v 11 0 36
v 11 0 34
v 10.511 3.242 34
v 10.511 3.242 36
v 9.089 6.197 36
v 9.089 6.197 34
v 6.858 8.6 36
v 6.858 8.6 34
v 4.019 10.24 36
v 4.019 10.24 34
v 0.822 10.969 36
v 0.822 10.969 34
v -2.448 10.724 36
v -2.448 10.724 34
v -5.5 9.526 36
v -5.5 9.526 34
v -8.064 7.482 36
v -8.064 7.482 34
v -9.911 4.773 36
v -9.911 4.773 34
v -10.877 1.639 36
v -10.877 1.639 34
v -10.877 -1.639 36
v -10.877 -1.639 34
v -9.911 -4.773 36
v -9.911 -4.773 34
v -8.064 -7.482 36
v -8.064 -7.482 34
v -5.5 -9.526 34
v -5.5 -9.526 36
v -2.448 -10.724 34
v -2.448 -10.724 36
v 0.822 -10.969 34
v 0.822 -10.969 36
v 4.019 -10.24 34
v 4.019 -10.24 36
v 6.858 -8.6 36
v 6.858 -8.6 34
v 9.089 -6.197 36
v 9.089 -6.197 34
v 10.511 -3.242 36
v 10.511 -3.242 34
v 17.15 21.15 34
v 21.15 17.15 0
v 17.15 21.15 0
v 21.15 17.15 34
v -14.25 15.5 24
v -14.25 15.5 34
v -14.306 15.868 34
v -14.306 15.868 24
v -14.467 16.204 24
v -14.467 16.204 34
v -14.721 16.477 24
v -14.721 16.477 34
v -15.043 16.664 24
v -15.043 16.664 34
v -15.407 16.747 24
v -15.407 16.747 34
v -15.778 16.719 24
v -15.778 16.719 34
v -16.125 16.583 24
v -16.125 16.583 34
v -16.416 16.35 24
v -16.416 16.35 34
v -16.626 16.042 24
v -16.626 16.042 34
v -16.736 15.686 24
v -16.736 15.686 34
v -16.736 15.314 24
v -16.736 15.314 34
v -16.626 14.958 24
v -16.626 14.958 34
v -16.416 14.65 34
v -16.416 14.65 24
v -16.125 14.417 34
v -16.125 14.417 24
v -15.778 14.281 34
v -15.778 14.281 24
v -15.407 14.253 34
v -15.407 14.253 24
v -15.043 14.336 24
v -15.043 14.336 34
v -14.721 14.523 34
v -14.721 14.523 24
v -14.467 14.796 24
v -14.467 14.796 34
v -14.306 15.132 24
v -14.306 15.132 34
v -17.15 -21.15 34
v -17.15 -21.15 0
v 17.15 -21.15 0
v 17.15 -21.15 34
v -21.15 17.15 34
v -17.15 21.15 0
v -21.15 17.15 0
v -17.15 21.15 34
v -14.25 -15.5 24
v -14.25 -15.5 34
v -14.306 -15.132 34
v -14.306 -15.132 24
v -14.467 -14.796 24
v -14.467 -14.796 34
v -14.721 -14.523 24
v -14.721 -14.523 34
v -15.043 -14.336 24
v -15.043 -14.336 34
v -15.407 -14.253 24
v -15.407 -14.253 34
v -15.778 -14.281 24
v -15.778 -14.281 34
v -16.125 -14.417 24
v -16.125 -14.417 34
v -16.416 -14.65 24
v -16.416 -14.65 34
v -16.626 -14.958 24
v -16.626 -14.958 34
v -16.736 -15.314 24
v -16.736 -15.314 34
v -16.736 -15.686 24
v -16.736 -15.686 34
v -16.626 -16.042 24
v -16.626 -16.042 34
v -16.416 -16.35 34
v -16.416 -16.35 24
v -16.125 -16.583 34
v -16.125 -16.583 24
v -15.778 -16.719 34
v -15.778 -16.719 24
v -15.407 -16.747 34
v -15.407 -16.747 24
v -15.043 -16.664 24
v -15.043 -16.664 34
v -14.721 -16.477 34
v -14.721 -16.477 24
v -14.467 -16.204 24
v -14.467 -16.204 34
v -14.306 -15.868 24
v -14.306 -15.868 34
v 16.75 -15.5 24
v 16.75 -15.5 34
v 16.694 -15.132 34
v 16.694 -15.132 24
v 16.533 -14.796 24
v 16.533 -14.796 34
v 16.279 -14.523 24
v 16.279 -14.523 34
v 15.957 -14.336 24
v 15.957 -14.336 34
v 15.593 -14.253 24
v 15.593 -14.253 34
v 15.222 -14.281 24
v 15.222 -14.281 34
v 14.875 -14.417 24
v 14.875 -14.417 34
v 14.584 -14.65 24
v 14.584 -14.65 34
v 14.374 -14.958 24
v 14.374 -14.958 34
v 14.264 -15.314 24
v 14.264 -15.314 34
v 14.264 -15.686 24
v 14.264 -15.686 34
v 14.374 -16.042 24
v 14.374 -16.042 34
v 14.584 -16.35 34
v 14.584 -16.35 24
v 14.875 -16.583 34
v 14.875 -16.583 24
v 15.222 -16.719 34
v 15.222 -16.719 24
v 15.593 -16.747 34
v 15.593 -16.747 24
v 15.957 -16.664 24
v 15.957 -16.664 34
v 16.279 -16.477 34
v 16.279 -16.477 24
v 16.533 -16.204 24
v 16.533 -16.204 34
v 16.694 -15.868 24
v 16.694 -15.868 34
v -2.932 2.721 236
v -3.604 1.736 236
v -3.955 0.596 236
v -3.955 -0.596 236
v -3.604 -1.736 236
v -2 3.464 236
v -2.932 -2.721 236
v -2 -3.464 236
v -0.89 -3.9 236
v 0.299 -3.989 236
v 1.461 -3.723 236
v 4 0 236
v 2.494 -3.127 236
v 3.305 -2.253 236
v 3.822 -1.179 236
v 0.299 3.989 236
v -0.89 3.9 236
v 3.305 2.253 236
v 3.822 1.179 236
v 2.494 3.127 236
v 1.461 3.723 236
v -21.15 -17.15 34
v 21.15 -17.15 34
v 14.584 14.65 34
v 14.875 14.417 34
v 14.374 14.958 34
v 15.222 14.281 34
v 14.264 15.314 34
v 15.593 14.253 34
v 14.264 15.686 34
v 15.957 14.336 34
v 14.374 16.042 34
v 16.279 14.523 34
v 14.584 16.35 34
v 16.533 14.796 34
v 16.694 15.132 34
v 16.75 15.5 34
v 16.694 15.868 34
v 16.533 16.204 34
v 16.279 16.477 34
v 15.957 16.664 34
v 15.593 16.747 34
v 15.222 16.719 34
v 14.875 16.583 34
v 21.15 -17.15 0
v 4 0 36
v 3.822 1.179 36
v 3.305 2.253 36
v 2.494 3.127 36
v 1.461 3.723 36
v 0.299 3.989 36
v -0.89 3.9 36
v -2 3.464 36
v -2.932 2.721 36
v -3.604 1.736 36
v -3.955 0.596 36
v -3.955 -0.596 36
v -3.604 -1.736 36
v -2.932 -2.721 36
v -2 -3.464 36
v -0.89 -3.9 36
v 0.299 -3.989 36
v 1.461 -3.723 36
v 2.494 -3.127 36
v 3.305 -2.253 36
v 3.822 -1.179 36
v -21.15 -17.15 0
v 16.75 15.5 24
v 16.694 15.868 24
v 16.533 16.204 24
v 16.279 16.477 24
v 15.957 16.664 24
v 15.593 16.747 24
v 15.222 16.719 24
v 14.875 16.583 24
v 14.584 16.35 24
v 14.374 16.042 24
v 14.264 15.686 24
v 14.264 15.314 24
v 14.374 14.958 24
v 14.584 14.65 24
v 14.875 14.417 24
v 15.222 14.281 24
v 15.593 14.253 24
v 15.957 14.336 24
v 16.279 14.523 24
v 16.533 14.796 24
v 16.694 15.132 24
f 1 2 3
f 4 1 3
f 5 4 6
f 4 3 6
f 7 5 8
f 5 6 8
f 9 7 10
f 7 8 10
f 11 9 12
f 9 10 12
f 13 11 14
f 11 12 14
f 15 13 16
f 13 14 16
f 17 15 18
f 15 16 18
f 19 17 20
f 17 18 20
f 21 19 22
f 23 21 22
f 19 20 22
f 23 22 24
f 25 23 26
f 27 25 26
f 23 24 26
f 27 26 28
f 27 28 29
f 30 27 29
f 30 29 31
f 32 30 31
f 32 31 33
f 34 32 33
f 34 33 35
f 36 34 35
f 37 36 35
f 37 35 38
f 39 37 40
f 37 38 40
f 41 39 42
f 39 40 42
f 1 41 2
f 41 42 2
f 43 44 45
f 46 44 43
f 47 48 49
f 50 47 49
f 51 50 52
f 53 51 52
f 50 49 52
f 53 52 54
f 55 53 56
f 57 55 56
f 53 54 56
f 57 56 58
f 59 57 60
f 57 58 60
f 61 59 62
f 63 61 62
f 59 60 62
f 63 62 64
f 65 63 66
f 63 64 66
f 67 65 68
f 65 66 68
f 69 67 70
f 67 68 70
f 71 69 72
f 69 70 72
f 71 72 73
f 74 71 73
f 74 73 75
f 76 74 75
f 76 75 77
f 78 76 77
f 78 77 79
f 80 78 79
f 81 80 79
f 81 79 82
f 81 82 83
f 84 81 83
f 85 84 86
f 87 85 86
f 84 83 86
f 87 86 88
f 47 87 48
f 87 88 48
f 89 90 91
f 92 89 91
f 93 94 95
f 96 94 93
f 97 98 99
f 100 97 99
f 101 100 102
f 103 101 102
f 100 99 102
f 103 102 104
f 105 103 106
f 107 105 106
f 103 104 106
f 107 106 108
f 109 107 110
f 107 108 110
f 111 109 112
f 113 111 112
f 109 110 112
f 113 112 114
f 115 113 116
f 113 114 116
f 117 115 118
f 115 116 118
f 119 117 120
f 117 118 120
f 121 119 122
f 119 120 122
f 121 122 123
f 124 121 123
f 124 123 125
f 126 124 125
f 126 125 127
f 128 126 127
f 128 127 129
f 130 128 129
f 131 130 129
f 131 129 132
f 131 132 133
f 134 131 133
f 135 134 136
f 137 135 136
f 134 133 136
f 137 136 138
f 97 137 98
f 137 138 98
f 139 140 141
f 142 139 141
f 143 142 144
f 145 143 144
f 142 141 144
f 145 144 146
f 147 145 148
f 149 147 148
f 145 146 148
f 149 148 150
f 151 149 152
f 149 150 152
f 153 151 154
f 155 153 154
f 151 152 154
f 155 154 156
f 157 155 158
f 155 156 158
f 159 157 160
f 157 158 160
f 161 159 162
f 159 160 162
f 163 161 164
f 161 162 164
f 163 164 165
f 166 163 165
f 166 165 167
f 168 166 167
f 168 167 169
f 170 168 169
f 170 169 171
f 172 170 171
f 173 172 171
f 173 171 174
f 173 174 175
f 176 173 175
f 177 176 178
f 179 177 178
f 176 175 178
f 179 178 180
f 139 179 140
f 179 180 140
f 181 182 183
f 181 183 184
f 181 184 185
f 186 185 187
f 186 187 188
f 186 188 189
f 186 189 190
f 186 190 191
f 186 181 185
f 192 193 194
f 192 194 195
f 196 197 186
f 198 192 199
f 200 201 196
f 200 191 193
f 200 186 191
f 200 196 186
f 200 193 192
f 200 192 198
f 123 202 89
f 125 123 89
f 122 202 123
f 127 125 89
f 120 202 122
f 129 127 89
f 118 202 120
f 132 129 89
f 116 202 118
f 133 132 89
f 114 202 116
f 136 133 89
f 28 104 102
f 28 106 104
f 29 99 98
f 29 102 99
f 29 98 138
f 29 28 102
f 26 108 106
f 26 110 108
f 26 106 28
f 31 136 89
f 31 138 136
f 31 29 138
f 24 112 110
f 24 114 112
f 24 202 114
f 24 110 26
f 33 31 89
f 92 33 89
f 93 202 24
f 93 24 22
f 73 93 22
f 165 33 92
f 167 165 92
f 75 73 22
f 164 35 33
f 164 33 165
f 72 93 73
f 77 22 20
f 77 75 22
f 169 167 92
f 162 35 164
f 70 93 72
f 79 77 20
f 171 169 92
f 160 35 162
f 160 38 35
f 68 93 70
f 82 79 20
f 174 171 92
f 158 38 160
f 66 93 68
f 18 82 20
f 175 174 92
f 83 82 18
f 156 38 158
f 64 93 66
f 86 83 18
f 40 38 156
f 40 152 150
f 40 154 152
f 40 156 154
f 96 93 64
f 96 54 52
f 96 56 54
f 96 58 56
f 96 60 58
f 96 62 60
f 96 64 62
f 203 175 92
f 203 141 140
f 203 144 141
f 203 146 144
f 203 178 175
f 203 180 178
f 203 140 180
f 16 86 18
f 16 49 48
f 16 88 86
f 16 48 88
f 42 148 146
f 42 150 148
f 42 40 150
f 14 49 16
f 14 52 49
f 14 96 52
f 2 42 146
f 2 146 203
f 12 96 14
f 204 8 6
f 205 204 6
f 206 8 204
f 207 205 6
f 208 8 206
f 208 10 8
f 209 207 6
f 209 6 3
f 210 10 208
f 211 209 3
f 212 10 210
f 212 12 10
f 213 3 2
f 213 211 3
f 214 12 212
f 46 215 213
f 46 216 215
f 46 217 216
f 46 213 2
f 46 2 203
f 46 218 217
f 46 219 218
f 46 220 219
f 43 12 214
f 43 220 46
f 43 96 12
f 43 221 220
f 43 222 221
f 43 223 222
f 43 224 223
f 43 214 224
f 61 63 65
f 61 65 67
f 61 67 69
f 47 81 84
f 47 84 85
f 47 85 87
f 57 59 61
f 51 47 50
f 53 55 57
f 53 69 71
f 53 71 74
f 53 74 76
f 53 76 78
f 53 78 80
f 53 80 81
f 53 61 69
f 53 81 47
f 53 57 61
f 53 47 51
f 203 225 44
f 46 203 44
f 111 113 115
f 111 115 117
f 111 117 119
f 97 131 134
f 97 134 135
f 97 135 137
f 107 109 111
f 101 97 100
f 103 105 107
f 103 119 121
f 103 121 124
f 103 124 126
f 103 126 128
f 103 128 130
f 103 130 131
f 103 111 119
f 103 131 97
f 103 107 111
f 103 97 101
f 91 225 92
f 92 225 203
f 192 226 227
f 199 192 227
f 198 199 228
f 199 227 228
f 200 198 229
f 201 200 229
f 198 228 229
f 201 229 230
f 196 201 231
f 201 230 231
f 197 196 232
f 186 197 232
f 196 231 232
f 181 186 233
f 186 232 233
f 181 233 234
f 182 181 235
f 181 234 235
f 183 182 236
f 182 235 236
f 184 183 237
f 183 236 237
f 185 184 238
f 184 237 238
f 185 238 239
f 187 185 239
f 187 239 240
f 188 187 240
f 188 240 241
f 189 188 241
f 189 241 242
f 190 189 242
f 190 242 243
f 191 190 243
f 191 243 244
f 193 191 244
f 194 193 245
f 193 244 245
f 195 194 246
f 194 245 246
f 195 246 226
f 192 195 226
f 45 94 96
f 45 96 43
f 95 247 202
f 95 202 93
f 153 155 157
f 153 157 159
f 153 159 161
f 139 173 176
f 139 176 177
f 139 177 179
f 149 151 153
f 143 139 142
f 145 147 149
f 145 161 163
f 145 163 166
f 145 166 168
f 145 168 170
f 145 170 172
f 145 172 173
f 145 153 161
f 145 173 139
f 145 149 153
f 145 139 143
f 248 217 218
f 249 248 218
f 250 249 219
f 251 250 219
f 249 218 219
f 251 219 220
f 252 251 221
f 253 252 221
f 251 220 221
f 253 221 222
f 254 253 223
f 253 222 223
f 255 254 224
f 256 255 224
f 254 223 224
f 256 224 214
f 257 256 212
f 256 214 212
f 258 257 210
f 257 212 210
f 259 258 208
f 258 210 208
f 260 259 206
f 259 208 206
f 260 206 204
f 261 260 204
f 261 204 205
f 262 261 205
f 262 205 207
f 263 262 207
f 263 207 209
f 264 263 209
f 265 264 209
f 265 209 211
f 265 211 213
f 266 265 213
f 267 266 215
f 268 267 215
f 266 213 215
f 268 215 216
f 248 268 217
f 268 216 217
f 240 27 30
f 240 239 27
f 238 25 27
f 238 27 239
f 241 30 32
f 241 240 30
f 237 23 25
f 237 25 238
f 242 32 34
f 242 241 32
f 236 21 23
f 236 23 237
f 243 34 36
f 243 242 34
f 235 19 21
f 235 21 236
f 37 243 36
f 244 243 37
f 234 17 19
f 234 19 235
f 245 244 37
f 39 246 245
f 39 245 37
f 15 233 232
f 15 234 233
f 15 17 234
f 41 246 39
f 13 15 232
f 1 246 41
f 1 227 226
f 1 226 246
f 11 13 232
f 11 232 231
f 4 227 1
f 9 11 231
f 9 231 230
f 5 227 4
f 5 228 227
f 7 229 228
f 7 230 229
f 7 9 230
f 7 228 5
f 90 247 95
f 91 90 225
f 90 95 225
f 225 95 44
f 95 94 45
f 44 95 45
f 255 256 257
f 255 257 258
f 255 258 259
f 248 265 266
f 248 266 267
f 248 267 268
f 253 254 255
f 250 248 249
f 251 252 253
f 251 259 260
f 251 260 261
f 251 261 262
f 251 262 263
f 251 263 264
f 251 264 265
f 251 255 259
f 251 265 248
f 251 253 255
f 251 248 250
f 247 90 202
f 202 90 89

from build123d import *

# Parameters (mm, degrees)
SKETCH1_W           = 42.3
SKETCH1_H           = 42.3
BOSS_EXTRUDE1_DEPTH = 34
SKETCH2_R           = 11
BOSS_EXTRUDE2_DEPTH = 2
SKETCH3_R           = 4
BOSS_EXTRUDE3_DEPTH = 200
CHAMFER1_SIZE       = 4
SKETCH4_R           = 1.25
CUT_EXTRUDE1_DEPTH  = 10


with BuildPart() as part:
    # Sketch1 → Boss-Extrude1 (new body)
    with BuildSketch(Plane.XY):
        Rectangle(SKETCH1_W, SKETCH1_H)
    extrude(amount=BOSS_EXTRUDE1_DEPTH)

    # Sketch2 → Boss-Extrude2 (add)
    with BuildSketch(Plane.XY.offset(34)):
        Circle(SKETCH2_R)
    extrude(amount=BOSS_EXTRUDE2_DEPTH)

    # Sketch3 → Boss-Extrude3 (add)
    with BuildSketch(Plane.XY.offset(36)):
        Circle(SKETCH3_R)
    extrude(amount=BOSS_EXTRUDE3_DEPTH)

    # Chamfer1
    chamfer1_edges = [part.edges().sort_by_distance(p)[0] for p in [
        (21.15, -21.15, 17),
        (-21.15, -21.15, 17),
        (-21.15, 21.15, 17),
        (21.15, 21.15, 17),
    ]]
    chamfer(chamfer1_edges, length=CHAMFER1_SIZE)

    # Sketch4 → Cut-Extrude1 (cut)
    with BuildSketch(Plane.XY.offset(34)):
        with Locations((-15.5, 15.5)):
            Circle(SKETCH4_R)
        with Locations((15.5, 15.5)):
            Circle(SKETCH4_R)
        with Locations((15.5, -15.5)):
            Circle(SKETCH4_R)
        with Locations((-15.5, -15.5)):
            Circle(SKETCH4_R)
    extrude(amount=-CUT_EXTRUDE1_DEPTH, mode=Mode.SUBTRACT)


solid = part.part
